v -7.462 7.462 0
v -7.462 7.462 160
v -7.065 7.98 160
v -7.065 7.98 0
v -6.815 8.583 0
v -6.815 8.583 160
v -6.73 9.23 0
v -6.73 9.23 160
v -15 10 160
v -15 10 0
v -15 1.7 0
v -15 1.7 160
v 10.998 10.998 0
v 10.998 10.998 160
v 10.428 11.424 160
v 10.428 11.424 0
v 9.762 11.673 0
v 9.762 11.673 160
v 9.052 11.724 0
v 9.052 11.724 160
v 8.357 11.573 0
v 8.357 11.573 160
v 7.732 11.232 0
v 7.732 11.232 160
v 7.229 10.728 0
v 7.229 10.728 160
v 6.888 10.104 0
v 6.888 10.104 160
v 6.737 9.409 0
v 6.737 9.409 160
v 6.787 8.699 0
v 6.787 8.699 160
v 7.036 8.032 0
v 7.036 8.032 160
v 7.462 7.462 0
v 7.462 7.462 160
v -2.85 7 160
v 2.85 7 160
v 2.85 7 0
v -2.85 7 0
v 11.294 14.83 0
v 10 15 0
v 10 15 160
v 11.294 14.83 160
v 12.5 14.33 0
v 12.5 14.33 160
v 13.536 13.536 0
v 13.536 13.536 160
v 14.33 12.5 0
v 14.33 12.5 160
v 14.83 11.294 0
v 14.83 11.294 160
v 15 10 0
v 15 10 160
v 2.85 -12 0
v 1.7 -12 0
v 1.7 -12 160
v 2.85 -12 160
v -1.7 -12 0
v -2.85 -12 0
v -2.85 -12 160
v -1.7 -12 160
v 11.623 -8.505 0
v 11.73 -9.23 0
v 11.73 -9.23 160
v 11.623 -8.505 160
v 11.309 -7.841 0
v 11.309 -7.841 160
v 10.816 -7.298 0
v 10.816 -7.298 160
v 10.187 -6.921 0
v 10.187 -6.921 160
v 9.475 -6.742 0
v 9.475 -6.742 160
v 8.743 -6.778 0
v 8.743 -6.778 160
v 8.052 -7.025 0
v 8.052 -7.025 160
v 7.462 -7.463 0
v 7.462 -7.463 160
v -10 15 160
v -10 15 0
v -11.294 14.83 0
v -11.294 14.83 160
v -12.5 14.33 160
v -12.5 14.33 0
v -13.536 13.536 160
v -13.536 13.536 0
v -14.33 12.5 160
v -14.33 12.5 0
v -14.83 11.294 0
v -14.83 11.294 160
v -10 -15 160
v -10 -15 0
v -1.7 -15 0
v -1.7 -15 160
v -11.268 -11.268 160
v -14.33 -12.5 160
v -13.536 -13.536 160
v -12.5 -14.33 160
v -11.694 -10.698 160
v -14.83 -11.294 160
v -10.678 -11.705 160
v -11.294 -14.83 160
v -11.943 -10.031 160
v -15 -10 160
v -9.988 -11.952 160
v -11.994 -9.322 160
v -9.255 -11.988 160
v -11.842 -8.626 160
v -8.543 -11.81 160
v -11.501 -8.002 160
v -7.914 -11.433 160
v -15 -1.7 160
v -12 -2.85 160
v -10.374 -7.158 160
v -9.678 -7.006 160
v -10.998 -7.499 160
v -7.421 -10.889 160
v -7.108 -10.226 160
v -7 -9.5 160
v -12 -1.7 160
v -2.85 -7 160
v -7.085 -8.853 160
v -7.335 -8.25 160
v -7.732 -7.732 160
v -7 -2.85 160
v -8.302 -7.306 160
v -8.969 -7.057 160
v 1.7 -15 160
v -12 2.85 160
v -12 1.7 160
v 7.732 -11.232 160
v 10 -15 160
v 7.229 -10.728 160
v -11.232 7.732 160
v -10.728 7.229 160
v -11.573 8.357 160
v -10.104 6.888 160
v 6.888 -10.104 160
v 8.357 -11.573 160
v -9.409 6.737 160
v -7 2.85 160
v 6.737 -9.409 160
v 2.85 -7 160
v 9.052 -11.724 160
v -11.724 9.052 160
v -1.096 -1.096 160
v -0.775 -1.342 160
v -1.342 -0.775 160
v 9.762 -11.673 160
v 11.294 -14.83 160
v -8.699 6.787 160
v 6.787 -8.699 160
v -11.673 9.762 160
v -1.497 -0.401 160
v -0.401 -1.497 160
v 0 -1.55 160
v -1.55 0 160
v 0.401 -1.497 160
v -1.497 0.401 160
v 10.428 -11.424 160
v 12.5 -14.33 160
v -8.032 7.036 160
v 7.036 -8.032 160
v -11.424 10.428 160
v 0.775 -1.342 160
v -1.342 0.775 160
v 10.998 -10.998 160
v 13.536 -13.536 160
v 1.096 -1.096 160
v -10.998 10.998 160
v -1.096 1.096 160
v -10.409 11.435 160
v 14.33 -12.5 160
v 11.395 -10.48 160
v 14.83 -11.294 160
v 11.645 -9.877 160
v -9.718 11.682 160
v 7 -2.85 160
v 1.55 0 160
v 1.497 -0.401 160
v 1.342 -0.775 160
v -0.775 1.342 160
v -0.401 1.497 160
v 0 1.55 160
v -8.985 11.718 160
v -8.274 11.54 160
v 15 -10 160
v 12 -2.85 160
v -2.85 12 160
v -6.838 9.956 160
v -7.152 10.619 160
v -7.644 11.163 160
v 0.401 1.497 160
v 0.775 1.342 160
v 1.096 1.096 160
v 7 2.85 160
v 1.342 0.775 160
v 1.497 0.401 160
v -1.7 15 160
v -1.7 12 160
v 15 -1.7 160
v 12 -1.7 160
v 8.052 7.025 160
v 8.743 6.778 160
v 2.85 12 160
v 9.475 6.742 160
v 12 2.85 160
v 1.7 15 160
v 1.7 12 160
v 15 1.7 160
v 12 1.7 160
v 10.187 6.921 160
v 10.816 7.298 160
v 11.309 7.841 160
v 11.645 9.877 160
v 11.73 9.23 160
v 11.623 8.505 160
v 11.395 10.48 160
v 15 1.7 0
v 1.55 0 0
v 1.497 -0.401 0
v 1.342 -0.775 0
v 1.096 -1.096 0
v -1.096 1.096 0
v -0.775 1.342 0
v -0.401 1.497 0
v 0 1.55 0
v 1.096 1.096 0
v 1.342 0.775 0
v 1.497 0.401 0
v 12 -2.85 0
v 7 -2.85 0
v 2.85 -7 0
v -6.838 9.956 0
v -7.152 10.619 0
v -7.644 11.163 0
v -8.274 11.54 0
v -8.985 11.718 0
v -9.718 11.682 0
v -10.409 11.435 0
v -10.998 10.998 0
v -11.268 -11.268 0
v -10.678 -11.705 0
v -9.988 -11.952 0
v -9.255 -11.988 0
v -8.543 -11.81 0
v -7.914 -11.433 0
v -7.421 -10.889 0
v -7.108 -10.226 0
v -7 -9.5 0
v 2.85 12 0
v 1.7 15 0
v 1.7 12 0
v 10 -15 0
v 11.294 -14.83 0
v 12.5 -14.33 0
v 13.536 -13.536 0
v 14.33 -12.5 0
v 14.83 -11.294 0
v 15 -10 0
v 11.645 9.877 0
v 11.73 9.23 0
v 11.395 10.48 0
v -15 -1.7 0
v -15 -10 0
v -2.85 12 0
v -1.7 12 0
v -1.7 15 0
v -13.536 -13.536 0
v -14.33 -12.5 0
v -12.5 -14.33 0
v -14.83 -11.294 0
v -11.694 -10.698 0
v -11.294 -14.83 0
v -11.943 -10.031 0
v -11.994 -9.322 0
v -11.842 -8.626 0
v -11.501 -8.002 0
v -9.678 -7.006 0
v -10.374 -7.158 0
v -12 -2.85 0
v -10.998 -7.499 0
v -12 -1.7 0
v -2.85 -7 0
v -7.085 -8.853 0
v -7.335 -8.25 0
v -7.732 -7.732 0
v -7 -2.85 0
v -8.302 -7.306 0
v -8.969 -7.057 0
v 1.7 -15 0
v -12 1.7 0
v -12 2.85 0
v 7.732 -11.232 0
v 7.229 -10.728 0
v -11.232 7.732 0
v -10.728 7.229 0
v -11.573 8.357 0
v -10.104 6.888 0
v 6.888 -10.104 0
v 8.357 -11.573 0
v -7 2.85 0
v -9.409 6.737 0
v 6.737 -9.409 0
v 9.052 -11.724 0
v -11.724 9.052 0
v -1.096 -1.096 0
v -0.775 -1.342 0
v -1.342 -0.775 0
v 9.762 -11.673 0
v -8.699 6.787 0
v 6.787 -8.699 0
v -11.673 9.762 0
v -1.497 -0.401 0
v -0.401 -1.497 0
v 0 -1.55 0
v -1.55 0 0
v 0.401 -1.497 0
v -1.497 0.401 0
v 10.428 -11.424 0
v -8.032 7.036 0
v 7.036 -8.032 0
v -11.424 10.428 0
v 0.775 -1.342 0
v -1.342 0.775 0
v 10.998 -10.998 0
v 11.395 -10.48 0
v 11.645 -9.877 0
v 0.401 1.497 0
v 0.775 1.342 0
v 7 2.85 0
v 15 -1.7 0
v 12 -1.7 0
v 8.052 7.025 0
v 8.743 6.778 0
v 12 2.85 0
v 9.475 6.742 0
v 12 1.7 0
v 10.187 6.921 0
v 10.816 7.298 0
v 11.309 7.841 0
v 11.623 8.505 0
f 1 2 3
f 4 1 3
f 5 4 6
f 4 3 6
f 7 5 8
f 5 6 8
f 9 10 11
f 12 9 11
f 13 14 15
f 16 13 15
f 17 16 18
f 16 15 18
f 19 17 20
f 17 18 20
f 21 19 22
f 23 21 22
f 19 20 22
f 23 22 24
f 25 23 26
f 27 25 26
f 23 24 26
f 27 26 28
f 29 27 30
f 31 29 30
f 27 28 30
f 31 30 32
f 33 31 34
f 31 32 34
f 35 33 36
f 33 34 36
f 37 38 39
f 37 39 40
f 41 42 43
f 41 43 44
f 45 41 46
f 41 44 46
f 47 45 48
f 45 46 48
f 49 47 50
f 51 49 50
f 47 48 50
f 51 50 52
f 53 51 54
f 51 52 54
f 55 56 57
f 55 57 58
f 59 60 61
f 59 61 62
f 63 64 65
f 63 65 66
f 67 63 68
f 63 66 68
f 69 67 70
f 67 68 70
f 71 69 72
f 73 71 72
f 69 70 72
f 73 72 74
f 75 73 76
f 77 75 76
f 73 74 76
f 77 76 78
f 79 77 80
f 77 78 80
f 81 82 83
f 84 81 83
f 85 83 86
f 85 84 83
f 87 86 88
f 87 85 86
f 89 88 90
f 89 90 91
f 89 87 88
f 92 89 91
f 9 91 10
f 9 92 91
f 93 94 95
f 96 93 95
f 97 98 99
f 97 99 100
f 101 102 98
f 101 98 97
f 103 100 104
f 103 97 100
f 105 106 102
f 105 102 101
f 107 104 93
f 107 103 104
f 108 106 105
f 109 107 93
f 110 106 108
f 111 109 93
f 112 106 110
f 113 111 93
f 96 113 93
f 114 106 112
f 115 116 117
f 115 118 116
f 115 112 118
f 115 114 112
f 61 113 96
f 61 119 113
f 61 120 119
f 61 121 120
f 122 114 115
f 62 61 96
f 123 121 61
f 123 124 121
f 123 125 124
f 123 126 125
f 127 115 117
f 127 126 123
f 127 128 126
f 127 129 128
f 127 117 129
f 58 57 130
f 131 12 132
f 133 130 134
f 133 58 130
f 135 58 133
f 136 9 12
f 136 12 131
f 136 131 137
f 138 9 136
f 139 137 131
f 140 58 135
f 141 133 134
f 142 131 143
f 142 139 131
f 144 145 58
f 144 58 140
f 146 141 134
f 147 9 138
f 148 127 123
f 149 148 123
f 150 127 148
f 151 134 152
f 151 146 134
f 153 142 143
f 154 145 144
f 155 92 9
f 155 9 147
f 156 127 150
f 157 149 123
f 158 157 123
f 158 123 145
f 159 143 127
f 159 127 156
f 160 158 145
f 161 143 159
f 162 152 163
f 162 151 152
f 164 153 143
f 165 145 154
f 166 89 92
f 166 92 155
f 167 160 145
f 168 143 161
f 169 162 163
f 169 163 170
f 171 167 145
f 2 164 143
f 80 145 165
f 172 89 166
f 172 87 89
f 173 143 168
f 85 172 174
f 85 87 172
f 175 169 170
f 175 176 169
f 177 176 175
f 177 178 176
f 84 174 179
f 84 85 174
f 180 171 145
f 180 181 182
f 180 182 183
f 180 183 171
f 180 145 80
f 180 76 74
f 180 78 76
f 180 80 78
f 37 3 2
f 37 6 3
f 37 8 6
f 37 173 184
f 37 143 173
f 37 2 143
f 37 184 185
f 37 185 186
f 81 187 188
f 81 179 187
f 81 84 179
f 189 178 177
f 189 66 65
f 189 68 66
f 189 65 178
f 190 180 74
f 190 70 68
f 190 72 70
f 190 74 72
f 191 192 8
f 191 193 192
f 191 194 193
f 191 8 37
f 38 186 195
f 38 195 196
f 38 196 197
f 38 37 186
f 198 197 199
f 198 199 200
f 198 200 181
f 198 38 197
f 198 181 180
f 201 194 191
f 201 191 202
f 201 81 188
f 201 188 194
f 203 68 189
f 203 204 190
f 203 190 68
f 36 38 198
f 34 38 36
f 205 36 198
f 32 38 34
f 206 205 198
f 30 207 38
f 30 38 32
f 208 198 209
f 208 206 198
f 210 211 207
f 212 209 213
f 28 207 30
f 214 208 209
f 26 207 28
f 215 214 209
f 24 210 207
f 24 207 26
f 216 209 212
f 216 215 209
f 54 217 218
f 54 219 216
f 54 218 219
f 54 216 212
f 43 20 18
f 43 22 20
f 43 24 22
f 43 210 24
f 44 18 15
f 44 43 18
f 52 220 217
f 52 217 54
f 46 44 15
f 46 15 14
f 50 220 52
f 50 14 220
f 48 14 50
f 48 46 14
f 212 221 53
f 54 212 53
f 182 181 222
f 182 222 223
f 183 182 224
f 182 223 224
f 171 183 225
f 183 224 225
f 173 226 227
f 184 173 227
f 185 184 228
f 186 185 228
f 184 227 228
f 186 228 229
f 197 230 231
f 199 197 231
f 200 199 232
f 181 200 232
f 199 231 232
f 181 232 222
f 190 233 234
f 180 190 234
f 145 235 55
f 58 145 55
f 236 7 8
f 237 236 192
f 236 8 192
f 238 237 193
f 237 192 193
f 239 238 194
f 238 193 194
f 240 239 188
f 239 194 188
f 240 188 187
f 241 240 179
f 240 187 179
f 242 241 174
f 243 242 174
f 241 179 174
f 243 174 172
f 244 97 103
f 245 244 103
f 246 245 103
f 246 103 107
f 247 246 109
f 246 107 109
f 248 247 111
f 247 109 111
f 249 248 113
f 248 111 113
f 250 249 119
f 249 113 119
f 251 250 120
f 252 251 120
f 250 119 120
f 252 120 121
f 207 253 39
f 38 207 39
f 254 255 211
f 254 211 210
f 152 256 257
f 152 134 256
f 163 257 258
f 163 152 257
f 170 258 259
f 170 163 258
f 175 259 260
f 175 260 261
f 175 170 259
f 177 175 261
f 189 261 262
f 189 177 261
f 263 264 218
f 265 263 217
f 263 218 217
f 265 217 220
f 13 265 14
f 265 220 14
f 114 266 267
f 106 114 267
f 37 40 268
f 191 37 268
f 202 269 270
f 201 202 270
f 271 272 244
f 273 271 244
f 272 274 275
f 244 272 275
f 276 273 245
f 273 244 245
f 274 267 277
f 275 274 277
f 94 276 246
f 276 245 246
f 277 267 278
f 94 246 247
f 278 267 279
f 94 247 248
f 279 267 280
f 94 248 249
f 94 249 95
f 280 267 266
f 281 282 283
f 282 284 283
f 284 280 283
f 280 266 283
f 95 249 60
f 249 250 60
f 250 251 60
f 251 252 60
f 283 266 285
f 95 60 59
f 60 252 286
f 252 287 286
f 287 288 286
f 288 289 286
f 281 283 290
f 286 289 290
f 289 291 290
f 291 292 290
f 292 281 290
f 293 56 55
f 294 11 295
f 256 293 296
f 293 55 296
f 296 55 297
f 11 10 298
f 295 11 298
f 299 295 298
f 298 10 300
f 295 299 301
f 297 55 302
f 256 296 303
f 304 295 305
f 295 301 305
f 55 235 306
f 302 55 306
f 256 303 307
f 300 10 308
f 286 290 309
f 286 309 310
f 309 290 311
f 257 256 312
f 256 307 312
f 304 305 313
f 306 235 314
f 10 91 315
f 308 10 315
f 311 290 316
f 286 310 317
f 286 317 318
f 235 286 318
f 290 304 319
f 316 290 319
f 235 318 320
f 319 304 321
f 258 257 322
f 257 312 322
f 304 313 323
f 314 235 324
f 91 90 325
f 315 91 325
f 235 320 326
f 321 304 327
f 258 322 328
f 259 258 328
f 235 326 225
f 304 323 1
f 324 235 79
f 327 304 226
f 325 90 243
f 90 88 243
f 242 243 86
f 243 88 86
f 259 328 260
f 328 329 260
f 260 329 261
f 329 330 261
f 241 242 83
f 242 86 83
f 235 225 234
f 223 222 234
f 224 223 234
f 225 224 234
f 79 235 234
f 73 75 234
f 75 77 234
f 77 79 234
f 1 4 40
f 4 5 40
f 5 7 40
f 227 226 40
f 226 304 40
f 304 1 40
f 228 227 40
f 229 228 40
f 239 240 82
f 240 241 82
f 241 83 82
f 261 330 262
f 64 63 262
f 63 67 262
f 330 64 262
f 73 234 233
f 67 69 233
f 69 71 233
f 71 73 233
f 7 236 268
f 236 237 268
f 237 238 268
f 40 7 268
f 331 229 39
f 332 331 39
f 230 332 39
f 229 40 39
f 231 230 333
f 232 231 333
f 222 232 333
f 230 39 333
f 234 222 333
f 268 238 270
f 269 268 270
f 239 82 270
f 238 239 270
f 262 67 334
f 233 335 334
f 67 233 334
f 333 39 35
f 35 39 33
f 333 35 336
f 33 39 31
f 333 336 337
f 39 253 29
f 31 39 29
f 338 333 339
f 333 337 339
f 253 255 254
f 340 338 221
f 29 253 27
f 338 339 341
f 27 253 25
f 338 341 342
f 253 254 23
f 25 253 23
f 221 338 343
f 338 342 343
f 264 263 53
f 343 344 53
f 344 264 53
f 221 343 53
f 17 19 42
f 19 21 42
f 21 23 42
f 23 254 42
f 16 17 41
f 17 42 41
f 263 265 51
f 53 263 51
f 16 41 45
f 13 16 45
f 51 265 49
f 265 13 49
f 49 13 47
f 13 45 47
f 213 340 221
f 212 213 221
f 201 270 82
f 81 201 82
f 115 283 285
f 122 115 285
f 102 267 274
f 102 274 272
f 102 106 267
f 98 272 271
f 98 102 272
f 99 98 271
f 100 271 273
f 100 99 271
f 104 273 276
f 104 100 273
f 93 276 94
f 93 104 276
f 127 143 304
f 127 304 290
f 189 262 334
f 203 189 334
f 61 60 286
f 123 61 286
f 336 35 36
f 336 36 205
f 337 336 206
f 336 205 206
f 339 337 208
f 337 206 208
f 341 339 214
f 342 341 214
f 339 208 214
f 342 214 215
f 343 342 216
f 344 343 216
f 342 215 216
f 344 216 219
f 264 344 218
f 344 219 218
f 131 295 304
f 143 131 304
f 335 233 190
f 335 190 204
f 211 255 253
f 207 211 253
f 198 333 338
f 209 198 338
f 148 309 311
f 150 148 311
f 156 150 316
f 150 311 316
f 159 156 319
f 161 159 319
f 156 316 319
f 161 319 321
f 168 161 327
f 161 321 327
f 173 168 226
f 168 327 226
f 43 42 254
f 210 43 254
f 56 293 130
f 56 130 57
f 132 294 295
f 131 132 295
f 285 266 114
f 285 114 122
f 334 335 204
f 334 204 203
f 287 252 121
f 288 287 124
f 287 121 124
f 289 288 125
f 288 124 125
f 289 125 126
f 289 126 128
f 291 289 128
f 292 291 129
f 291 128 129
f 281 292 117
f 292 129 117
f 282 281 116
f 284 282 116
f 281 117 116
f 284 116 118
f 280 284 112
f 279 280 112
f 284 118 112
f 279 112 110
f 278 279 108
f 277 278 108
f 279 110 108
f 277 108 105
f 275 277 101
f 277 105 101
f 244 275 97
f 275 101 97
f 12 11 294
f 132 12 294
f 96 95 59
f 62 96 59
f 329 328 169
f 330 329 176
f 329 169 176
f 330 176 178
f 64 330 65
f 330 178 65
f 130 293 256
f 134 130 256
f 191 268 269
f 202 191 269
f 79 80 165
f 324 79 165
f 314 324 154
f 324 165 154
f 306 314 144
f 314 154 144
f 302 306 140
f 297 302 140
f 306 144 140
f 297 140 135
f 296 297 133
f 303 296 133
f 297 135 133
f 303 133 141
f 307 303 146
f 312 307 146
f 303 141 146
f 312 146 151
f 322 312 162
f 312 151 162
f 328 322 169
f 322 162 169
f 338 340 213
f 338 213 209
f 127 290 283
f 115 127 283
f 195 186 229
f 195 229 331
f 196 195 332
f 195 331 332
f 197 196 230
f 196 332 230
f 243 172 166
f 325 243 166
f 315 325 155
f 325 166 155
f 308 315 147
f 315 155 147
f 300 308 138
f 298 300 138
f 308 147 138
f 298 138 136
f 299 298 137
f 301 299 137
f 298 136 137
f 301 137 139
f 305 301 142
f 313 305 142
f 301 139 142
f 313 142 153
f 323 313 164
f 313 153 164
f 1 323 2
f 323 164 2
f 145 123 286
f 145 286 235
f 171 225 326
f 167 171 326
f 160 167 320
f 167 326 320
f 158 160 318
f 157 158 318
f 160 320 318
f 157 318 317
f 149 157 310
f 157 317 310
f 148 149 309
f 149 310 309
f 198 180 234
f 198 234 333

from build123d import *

# Parameters (mm, degrees)
F0_W     = 1.15
F0_H     = 3
F0_W_2   = 3
F0_H_2   = 1.15
F1_DEPTH = 160
F2_R     = 5
F4_DEPTH = 200


with BuildPart() as f1:
    # F0 (on Top) → F1 (new body)
    with BuildSketch(Plane.XY):
        with BuildLine():
            Line((7.5, 7.5), (15, 15))
            Line((15, 15), (2.85, 15))
            Line((2.85, 15), (2.85, 12))
            Line((2.85, 12), (2.85, 7))
            Line((2.85, 7), (0, 7))
            Line((0, 7), (0, 1.55))
            ThreePointArc((0, 1.55), (0.5931593202, 1.4320132754), (1.0960155108, 1.0960155108))
            Line((1.0960155108, 1.0960155108), (7.5, 7.5))
        make_face()
        with BuildLine():
            Line((15, 2.85), (15, 15))
            Line((15, 15), (7.5, 7.5))
            Line((7.5, 7.5), (1.0960155108, 1.0960155108))
            ThreePointArc((1.0960155108, 1.0960155108), (1.4320132754, 0.5931593202), (1.55, 0))
            ThreePointArc((1.55, 0), (1.4320132754, -0.5931593202), (1.0960155108, -1.0960155108))
            Line((1.0960155108, -1.0960155108), (7.5, -7.5))
            Line((7.5, -7.5), (15, -15))
            Line((15, -15), (15, -2.85))
            Line((15, -2.85), (12, -2.85))
            Line((12, -2.85), (7, -2.85))
            Line((7, -2.85), (7, 2.85))
            Line((7, 2.85), (12, 2.85))
            Line((12, 2.85), (15, 2.85))
        make_face()
        with Locations((2.275, 13.5)):
            Rectangle(F0_W, F0_H)
        with Locations((13.5, 2.275)):
            Rectangle(F0_W_2, F0_H_2)
        with BuildLine():
            ThreePointArc((-1.0960155108, 1.0960155108), (-0.5931593202, 1.4320132754), (0, 1.55))
            Line((0, 1.55), (0, 7))
            Line((0, 7), (-2.85, 7))
            Line((-2.85, 7), (-2.85, 12))
            Line((-2.85, 12), (-2.85, 15))
            Line((-2.85, 15), (-15, 15))
            Line((-15, 15), (-7.5, 7.5))
            Line((-7.5, 7.5), (-1.0960155108, 1.0960155108))
        make_face()
        with Locations((-2.275, 13.5)):
            Rectangle(F0_W, F0_H)
        with Locations((13.5, -2.275)):
            Rectangle(F0_W_2, F0_H_2)
        with BuildLine():
            Line((7.5, -7.5), (1.0960155108, -1.0960155108))
            ThreePointArc((1.0960155108, -1.0960155108), (0, -1.55), (-1.0960155108, -1.0960155108))
            Line((-1.0960155108, -1.0960155108), (-7.5, -7.5))
            Line((-7.5, -7.5), (-15, -15))
            Line((-15, -15), (-2.85, -15))
            Line((-2.85, -15), (-2.85, -12))
            Line((-2.85, -12), (-2.85, -7))
            Line((-2.85, -7), (2.85, -7))
            Line((2.85, -7), (2.85, -12))
            Line((2.85, -12), (2.85, -15))
            Line((2.85, -15), (15, -15))
            Line((15, -15), (7.5, -7.5))
        make_face()
        with BuildLine():
            ThreePointArc((-1.0960155108, -1.0960155108), (-1.55, 0), (-1.0960155108, 1.0960155108))
            Line((-1.0960155108, 1.0960155108), (-7.5, 7.5))
            Line((-7.5, 7.5), (-15, 15))
            Line((-15, 15), (-15, 2.85))
            Line((-15, 2.85), (-12, 2.85))
            Line((-12, 2.85), (-7, 2.85))
            Line((-7, 2.85), (-7, -2.85))
            Line((-7, -2.85), (-12, -2.85))
            Line((-12, -2.85), (-15, -2.85))
            Line((-15, -2.85), (-15, -15))
            Line((-15, -15), (-7.5, -7.5))
            Line((-7.5, -7.5), (-1.0960155108, -1.0960155108))
        make_face()
        with Locations((-13.5, 2.275)):
            Rectangle(F0_W_2, F0_H_2)
        with Locations((2.275, -13.5)):
            Rectangle(F0_W, F0_H)
        with Locations((-2.275, -13.5)):
            Rectangle(F0_W, F0_H)
        with Locations((-13.5, -2.275)):
            Rectangle(F0_W_2, F0_H_2)
    extrude(amount=F1_DEPTH)

    # F2
    f2_edges = [f1.edges().sort_by_distance(p)[0] for p in [
        (15, -15, 80),
        (-15, -15, 80),
        (15, 15, 80),
        (-15, 15, 80),
    ]]
    fillet(f2_edges, radius=F2_R)

    # F3 (on face) → F4 (cut)
    with BuildSketch(Plane.XY.offset(160)):
        with BuildLine():
            ThreePointArc((-7, -9.5), (-7.1903011687, -8.5432914191), (-7.732233047, -7.732233047))
            Line((-7.732233047, -7.732233047), (-11.267766953, -11.267766953))
            ThreePointArc((-11.267766953, -11.267766953), (-8.5432914191, -11.8096988313), (-7, -9.5))
        make_face()
        with BuildLine():
            Line((-11.267766953, -11.267766953), (-7.732233047, -7.732233047))
            ThreePointArc((-7.732233047, -7.732233047), (-11.267766953, -7.732233047), (-11.267766953, -11.267766953))
        make_face()
        with BuildLine():
            ThreePointArc((11.730266953, -9.230266953), (10.1869755339, -6.9205681217), (7.4625, -7.4625))
            Line((7.4625, -7.4625), (10.9980339059, -10.9980339059))
            ThreePointArc((10.9980339059, -10.9980339059), (11.5399657842, -10.1869755339), (11.730266953, -9.230266953))
        make_face()
        with BuildLine():
            Line((10.9980339059, -10.9980339059), (7.4625, -7.4625))
            ThreePointArc((7.4625, -7.4625), (7.4625, -10.9980339059), (10.9980339059, -10.9980339059))
        make_face()
        with BuildLine():
            ThreePointArc((10.9980339059, 10.9980339059), (7.4625, 10.9980339059), (7.4625, 7.4625))
            Line((7.4625, 7.4625), (10.9980339059, 10.9980339059))
        make_face()
        with BuildLine():
            Line((10.9980339059, 10.9980339059), (7.4625, 7.4625))
            ThreePointArc((7.4625, 7.4625), (10.1869755339, 6.9205681217), (11.730266953, 9.230266953))
            ThreePointArc((11.730266953, 9.230266953), (11.5399657842, 10.1869755339), (10.9980339059, 10.9980339059))
        make_face()
        with BuildLine():
            ThreePointArc((-10.9980339059, 10.9980339059), (-10.9980339059, 7.4625), (-7.4625, 7.4625))
            Line((-7.4625, 7.4625), (-10.9980339059, 10.9980339059))
        make_face()
        with BuildLine():
            Line((-10.9980339059, 10.9980339059), (-7.4625, 7.4625))
            ThreePointArc((-7.4625, 7.4625), (-6.9205681217, 8.2735583721), (-6.730266953, 9.230266953))
            ThreePointArc((-6.730266953, 9.230266953), (-8.2735583721, 11.5399657842), (-10.9980339059, 10.9980339059))
        make_face()
    extrude(amount=-F4_DEPTH, mode=Mode.SUBTRACT)


solid = f1.part
